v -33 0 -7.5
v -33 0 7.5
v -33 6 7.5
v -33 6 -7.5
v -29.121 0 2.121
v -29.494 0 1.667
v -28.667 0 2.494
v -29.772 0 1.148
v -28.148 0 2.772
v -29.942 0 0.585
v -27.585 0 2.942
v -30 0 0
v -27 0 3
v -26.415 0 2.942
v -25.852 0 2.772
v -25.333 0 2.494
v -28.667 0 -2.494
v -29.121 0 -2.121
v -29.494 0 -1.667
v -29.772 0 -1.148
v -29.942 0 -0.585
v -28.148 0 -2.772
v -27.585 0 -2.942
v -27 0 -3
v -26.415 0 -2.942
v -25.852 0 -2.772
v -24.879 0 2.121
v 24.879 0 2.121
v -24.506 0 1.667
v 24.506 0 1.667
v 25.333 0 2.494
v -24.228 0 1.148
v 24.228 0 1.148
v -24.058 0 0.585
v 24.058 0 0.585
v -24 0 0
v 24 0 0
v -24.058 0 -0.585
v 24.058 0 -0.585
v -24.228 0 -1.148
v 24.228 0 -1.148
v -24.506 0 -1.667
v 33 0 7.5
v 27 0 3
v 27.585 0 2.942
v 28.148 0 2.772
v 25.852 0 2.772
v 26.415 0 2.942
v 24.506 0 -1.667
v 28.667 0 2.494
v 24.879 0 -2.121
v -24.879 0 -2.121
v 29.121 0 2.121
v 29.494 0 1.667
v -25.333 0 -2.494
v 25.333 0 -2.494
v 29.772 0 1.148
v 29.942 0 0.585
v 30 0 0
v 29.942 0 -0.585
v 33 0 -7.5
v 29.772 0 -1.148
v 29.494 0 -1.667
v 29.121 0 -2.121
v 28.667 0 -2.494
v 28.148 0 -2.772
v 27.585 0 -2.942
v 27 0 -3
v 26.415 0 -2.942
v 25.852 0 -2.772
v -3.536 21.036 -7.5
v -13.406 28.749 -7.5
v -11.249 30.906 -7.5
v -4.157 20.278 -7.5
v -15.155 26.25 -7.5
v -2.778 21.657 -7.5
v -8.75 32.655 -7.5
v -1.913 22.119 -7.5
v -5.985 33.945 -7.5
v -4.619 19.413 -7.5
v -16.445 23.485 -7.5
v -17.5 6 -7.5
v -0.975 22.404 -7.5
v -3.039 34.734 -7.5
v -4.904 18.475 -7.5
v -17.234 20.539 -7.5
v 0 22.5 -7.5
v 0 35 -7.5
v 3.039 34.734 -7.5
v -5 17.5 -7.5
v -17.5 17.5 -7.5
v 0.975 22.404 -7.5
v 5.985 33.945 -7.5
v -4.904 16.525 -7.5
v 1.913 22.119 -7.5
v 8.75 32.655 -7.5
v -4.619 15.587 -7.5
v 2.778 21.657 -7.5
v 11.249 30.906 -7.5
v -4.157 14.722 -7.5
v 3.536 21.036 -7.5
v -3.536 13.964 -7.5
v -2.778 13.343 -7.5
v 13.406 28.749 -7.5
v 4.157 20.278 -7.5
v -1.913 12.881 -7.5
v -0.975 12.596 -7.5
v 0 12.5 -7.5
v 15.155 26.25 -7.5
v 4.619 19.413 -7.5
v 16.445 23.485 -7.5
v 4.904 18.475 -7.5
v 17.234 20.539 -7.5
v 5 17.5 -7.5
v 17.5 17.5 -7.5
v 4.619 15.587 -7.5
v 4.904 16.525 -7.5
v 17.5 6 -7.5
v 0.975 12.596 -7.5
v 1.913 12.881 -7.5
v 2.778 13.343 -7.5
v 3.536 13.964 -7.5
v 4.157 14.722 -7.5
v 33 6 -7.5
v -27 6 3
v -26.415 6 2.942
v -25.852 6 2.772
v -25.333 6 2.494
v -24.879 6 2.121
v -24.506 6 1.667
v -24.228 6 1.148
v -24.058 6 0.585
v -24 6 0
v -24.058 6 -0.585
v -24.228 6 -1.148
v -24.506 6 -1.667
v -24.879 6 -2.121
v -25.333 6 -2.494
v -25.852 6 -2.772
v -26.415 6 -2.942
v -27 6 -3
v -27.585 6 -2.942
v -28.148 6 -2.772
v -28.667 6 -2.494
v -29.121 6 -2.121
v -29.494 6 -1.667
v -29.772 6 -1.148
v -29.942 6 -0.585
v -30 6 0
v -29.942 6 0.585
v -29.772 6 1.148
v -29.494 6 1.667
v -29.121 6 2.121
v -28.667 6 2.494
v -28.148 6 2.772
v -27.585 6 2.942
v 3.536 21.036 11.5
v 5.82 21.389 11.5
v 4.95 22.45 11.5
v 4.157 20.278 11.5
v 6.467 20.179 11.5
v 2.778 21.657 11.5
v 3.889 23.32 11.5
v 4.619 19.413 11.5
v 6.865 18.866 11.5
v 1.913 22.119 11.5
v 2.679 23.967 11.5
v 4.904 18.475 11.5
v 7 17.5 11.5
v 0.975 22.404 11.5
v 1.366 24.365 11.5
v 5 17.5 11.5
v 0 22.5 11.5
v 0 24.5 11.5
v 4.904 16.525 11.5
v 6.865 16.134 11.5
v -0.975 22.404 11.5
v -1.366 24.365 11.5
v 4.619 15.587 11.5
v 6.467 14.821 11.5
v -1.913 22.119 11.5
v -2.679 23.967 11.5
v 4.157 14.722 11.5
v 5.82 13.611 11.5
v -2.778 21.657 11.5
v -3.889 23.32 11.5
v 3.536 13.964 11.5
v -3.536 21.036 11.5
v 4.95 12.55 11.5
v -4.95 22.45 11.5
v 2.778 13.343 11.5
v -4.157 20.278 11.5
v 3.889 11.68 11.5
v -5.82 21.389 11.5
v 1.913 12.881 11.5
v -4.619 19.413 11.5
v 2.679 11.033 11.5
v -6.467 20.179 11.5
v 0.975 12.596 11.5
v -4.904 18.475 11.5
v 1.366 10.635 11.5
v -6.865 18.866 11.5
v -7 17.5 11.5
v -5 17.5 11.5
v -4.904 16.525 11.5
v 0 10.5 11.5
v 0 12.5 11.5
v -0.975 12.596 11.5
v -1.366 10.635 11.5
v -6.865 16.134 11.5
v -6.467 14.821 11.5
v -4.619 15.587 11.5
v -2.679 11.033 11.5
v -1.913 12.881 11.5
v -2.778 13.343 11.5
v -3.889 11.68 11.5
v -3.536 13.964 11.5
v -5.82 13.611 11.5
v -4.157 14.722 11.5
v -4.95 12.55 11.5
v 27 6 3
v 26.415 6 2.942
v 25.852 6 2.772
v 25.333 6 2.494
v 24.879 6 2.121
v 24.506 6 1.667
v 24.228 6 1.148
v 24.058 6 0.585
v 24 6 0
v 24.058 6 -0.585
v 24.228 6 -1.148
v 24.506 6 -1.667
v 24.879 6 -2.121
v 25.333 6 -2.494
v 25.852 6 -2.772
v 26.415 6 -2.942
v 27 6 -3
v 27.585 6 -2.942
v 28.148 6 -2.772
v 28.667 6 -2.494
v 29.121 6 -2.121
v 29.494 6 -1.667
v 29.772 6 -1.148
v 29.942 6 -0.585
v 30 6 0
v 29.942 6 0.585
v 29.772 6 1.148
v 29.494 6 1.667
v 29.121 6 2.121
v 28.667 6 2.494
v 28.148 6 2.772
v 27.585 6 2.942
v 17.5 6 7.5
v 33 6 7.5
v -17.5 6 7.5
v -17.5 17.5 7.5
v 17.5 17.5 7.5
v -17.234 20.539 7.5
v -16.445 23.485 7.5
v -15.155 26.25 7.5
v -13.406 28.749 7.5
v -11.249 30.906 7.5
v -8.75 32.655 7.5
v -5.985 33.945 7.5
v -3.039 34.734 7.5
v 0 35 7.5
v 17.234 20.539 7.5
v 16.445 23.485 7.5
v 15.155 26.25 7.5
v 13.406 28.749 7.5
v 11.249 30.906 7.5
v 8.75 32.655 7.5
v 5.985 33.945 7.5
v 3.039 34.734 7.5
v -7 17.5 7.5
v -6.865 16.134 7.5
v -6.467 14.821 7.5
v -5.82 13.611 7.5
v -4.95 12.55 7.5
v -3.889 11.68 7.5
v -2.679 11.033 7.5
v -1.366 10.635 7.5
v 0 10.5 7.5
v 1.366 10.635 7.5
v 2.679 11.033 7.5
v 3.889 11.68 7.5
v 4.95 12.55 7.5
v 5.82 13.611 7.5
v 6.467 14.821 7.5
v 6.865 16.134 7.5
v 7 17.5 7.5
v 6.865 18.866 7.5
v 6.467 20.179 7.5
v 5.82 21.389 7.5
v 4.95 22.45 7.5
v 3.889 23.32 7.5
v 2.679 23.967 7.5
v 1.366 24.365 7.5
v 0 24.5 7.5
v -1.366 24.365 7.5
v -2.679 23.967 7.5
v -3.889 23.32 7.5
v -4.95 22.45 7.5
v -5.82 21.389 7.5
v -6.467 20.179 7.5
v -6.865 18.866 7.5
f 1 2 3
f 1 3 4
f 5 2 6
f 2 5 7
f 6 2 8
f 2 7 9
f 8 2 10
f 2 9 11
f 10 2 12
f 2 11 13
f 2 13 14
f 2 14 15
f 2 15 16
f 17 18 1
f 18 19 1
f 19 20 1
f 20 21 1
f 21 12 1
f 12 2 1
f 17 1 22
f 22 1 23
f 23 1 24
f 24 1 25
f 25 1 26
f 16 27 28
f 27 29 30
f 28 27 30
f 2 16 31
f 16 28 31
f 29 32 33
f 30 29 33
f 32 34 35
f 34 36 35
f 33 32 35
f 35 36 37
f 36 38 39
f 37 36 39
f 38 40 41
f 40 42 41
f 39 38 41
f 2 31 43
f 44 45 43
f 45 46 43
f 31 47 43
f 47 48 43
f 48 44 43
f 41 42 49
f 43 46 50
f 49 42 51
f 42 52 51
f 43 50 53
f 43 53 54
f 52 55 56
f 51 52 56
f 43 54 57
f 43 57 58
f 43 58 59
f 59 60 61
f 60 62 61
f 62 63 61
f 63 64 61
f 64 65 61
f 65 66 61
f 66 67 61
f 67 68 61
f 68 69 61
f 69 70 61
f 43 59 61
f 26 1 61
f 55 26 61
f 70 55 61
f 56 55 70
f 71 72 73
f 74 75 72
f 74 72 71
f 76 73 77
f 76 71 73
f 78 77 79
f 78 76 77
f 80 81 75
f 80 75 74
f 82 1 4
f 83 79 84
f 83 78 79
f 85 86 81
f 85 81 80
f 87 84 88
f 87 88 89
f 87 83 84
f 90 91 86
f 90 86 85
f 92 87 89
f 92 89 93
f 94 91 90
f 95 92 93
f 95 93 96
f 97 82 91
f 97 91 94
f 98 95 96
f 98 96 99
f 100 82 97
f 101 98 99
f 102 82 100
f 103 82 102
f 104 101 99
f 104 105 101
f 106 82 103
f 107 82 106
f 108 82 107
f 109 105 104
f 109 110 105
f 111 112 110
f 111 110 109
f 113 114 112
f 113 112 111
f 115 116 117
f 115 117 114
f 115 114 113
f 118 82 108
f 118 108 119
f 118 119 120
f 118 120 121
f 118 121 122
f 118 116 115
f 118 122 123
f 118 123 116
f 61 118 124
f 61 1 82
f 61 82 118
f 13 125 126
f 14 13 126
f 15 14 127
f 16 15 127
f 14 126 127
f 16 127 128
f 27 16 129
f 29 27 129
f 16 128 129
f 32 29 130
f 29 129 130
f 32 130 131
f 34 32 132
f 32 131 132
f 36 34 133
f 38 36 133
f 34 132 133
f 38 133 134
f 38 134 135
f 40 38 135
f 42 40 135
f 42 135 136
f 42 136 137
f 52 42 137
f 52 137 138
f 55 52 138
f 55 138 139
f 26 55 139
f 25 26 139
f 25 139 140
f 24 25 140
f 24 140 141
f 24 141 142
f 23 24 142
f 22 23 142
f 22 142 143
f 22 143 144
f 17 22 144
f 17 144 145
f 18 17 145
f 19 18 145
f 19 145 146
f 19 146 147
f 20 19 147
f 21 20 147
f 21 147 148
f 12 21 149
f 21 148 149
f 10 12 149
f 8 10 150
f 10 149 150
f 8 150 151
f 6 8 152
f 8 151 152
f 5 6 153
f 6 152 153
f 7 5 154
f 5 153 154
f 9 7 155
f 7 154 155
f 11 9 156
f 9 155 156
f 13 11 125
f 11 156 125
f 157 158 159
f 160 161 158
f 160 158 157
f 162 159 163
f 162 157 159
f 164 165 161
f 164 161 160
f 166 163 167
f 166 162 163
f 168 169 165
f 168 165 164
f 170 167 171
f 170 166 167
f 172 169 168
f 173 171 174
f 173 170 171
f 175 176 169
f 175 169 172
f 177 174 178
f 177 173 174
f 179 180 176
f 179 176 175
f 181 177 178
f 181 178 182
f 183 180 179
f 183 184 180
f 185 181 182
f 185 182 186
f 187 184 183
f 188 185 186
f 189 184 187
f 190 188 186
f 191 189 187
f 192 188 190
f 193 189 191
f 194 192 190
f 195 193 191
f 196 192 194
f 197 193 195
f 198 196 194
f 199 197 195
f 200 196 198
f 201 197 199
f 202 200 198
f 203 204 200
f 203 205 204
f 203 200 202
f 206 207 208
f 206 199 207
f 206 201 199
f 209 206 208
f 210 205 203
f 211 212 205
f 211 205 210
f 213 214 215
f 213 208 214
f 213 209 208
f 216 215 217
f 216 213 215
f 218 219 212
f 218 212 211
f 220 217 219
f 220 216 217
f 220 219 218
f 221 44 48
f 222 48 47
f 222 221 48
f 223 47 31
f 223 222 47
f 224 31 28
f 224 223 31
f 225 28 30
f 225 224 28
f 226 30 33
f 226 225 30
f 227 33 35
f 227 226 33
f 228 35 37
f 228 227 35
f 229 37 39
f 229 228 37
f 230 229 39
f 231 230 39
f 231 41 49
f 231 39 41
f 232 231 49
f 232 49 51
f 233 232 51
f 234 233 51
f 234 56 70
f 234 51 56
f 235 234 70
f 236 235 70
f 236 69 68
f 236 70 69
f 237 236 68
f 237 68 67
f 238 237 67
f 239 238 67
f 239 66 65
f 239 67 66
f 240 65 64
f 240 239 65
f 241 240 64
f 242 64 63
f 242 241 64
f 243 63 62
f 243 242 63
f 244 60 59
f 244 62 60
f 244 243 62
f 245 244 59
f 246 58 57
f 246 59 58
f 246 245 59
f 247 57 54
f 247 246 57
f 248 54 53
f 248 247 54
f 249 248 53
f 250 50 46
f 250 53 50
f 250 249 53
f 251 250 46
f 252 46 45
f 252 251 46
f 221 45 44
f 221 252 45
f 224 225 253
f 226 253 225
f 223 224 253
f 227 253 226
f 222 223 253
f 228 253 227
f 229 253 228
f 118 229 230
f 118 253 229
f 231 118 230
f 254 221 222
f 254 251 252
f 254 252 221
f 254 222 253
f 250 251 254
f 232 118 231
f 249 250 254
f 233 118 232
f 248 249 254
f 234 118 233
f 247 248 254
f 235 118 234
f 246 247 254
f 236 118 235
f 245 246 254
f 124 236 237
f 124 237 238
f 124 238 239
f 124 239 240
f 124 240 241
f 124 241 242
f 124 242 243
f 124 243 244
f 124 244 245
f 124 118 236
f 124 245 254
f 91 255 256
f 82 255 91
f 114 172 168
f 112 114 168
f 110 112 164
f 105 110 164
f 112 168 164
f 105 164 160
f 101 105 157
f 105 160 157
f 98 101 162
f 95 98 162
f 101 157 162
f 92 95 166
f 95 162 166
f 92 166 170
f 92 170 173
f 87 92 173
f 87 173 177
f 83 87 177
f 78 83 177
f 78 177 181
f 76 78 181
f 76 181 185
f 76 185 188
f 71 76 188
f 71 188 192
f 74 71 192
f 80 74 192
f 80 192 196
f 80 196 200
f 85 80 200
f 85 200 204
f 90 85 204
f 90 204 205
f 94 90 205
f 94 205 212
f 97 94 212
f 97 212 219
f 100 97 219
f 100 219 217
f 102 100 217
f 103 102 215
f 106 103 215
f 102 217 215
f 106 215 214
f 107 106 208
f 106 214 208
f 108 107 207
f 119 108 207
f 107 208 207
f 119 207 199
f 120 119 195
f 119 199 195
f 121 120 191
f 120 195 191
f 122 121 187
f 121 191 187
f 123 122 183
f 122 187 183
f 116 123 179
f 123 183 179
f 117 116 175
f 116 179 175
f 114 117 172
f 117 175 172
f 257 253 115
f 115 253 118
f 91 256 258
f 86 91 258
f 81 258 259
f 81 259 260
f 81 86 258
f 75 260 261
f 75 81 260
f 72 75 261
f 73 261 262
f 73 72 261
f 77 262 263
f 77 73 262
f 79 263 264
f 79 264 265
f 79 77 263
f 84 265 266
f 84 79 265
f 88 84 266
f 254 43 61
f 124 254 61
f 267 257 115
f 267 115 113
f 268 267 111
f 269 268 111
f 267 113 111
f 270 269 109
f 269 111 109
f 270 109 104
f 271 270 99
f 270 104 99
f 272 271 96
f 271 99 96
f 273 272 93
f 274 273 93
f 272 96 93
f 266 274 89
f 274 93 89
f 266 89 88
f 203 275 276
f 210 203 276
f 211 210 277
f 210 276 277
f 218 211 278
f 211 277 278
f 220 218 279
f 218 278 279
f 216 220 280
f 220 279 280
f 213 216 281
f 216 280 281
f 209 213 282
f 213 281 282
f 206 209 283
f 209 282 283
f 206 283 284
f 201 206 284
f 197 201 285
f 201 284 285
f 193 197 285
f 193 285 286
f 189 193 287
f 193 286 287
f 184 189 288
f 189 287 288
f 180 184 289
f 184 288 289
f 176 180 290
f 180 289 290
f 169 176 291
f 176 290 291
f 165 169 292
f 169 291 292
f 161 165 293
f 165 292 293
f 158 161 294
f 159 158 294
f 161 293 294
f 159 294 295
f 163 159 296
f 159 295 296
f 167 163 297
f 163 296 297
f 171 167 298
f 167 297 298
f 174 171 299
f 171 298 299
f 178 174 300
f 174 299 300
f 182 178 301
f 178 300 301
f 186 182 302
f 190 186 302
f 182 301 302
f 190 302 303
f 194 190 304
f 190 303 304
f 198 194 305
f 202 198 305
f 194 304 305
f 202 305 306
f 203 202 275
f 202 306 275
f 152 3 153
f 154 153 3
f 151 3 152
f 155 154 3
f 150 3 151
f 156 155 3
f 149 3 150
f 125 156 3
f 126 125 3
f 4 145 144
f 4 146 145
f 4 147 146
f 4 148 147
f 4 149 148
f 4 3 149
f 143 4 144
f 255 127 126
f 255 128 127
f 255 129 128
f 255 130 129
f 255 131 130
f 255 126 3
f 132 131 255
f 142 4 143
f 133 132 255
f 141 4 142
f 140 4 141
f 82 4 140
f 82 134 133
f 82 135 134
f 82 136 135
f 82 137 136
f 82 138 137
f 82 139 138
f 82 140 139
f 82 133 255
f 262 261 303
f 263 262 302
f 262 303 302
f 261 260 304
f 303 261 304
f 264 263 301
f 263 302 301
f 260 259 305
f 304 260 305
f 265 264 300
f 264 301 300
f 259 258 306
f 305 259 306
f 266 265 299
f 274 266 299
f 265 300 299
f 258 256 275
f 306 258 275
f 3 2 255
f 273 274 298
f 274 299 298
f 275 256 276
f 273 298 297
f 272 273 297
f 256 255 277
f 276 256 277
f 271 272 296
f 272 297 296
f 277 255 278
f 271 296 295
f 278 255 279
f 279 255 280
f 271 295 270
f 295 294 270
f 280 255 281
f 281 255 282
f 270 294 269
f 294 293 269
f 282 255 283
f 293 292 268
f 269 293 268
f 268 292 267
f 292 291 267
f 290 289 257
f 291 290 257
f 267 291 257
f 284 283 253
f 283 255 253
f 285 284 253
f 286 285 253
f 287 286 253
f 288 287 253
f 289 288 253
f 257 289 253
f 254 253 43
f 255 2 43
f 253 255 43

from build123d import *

# Parameters (mm, degrees)
SKETCH1_W           = 66
SKETCH1_H           = 15
BOSS_EXTRUDE1_DEPTH = 6
SKETCH2_W           = 35
SKETCH2_H           = 15
BOSS_EXTRUDE2_DEPTH = 29
FILLET1_R           = 17.5
SKETCH3_R           = 7
BOSS_EXTRUDE3_DEPTH = 4
SKETCH4_R           = 5
CUT_EXTRUDE1_DEPTH  = 52.720402164
SKETCH5_R           = 3
CUT_EXTRUDE2_DEPTH  = 46.412002819


with BuildPart() as part:
    # Sketch1 → Boss-Extrude1 (new body)
    with BuildSketch(Plane(origin=(0, 0, 0), x_dir=(1, 0, 0), z_dir=(0, 1, 0))):
        Rectangle(SKETCH1_W, SKETCH1_H)
    extrude(amount=BOSS_EXTRUDE1_DEPTH)

    # Sketch2 → Boss-Extrude2 (add)
    with BuildSketch(Plane(origin=(0, 6, 0), x_dir=(1, 0, 0), z_dir=(0, 1, 0))):
        Rectangle(SKETCH2_W, SKETCH2_H)
    extrude(amount=BOSS_EXTRUDE2_DEPTH)

    # Fillet1
    fillet1_edges = [part.edges().sort_by_distance(p)[0] for p in [
        (17.5, 35, 0),
        (-17.5, 35, 0),
    ]]
    fillet(fillet1_edges, radius=FILLET1_R - 0.0001)  # a hair under: the kernel refuses the full size

    # Sketch3 → Boss-Extrude3 (add)
    with BuildSketch(Plane.XY.offset(7.5)):
        with Locations(Location((0, 17.5, 0), (0, 0, 180))):
            Circle(SKETCH3_R)
    extrude(amount=BOSS_EXTRUDE3_DEPTH)

    # Sketch4 → Cut-Extrude1 (cut, through all)
    with BuildSketch(Plane.XY.offset(11.5)):
        with Locations((0, 17.5)):
            Circle(SKETCH4_R)
    extrude(amount=-CUT_EXTRUDE1_DEPTH, mode=Mode.SUBTRACT)

    # Sketch5 → Cut-Extrude2 (cut, through all)
    with BuildSketch(Plane(origin=(0, 6, 0), x_dir=(1, 0, 0), z_dir=(0, 1, 0))):
        with Locations(Location((-27, 0, 0), (0, 0, 270))):
            Circle(SKETCH5_R)
    cut_extrude2 = extrude(amount=-CUT_EXTRUDE2_DEPTH, mode=Mode.SUBTRACT)

    # Mirror1: Cut-Extrude2 across plane
    add(cut_extrude2.mirror(Plane(origin=(0, 0, 0), x_dir=(0, 0, 1), z_dir=(1, 0, 0))), mode=Mode.SUBTRACT)


solid = part.part
